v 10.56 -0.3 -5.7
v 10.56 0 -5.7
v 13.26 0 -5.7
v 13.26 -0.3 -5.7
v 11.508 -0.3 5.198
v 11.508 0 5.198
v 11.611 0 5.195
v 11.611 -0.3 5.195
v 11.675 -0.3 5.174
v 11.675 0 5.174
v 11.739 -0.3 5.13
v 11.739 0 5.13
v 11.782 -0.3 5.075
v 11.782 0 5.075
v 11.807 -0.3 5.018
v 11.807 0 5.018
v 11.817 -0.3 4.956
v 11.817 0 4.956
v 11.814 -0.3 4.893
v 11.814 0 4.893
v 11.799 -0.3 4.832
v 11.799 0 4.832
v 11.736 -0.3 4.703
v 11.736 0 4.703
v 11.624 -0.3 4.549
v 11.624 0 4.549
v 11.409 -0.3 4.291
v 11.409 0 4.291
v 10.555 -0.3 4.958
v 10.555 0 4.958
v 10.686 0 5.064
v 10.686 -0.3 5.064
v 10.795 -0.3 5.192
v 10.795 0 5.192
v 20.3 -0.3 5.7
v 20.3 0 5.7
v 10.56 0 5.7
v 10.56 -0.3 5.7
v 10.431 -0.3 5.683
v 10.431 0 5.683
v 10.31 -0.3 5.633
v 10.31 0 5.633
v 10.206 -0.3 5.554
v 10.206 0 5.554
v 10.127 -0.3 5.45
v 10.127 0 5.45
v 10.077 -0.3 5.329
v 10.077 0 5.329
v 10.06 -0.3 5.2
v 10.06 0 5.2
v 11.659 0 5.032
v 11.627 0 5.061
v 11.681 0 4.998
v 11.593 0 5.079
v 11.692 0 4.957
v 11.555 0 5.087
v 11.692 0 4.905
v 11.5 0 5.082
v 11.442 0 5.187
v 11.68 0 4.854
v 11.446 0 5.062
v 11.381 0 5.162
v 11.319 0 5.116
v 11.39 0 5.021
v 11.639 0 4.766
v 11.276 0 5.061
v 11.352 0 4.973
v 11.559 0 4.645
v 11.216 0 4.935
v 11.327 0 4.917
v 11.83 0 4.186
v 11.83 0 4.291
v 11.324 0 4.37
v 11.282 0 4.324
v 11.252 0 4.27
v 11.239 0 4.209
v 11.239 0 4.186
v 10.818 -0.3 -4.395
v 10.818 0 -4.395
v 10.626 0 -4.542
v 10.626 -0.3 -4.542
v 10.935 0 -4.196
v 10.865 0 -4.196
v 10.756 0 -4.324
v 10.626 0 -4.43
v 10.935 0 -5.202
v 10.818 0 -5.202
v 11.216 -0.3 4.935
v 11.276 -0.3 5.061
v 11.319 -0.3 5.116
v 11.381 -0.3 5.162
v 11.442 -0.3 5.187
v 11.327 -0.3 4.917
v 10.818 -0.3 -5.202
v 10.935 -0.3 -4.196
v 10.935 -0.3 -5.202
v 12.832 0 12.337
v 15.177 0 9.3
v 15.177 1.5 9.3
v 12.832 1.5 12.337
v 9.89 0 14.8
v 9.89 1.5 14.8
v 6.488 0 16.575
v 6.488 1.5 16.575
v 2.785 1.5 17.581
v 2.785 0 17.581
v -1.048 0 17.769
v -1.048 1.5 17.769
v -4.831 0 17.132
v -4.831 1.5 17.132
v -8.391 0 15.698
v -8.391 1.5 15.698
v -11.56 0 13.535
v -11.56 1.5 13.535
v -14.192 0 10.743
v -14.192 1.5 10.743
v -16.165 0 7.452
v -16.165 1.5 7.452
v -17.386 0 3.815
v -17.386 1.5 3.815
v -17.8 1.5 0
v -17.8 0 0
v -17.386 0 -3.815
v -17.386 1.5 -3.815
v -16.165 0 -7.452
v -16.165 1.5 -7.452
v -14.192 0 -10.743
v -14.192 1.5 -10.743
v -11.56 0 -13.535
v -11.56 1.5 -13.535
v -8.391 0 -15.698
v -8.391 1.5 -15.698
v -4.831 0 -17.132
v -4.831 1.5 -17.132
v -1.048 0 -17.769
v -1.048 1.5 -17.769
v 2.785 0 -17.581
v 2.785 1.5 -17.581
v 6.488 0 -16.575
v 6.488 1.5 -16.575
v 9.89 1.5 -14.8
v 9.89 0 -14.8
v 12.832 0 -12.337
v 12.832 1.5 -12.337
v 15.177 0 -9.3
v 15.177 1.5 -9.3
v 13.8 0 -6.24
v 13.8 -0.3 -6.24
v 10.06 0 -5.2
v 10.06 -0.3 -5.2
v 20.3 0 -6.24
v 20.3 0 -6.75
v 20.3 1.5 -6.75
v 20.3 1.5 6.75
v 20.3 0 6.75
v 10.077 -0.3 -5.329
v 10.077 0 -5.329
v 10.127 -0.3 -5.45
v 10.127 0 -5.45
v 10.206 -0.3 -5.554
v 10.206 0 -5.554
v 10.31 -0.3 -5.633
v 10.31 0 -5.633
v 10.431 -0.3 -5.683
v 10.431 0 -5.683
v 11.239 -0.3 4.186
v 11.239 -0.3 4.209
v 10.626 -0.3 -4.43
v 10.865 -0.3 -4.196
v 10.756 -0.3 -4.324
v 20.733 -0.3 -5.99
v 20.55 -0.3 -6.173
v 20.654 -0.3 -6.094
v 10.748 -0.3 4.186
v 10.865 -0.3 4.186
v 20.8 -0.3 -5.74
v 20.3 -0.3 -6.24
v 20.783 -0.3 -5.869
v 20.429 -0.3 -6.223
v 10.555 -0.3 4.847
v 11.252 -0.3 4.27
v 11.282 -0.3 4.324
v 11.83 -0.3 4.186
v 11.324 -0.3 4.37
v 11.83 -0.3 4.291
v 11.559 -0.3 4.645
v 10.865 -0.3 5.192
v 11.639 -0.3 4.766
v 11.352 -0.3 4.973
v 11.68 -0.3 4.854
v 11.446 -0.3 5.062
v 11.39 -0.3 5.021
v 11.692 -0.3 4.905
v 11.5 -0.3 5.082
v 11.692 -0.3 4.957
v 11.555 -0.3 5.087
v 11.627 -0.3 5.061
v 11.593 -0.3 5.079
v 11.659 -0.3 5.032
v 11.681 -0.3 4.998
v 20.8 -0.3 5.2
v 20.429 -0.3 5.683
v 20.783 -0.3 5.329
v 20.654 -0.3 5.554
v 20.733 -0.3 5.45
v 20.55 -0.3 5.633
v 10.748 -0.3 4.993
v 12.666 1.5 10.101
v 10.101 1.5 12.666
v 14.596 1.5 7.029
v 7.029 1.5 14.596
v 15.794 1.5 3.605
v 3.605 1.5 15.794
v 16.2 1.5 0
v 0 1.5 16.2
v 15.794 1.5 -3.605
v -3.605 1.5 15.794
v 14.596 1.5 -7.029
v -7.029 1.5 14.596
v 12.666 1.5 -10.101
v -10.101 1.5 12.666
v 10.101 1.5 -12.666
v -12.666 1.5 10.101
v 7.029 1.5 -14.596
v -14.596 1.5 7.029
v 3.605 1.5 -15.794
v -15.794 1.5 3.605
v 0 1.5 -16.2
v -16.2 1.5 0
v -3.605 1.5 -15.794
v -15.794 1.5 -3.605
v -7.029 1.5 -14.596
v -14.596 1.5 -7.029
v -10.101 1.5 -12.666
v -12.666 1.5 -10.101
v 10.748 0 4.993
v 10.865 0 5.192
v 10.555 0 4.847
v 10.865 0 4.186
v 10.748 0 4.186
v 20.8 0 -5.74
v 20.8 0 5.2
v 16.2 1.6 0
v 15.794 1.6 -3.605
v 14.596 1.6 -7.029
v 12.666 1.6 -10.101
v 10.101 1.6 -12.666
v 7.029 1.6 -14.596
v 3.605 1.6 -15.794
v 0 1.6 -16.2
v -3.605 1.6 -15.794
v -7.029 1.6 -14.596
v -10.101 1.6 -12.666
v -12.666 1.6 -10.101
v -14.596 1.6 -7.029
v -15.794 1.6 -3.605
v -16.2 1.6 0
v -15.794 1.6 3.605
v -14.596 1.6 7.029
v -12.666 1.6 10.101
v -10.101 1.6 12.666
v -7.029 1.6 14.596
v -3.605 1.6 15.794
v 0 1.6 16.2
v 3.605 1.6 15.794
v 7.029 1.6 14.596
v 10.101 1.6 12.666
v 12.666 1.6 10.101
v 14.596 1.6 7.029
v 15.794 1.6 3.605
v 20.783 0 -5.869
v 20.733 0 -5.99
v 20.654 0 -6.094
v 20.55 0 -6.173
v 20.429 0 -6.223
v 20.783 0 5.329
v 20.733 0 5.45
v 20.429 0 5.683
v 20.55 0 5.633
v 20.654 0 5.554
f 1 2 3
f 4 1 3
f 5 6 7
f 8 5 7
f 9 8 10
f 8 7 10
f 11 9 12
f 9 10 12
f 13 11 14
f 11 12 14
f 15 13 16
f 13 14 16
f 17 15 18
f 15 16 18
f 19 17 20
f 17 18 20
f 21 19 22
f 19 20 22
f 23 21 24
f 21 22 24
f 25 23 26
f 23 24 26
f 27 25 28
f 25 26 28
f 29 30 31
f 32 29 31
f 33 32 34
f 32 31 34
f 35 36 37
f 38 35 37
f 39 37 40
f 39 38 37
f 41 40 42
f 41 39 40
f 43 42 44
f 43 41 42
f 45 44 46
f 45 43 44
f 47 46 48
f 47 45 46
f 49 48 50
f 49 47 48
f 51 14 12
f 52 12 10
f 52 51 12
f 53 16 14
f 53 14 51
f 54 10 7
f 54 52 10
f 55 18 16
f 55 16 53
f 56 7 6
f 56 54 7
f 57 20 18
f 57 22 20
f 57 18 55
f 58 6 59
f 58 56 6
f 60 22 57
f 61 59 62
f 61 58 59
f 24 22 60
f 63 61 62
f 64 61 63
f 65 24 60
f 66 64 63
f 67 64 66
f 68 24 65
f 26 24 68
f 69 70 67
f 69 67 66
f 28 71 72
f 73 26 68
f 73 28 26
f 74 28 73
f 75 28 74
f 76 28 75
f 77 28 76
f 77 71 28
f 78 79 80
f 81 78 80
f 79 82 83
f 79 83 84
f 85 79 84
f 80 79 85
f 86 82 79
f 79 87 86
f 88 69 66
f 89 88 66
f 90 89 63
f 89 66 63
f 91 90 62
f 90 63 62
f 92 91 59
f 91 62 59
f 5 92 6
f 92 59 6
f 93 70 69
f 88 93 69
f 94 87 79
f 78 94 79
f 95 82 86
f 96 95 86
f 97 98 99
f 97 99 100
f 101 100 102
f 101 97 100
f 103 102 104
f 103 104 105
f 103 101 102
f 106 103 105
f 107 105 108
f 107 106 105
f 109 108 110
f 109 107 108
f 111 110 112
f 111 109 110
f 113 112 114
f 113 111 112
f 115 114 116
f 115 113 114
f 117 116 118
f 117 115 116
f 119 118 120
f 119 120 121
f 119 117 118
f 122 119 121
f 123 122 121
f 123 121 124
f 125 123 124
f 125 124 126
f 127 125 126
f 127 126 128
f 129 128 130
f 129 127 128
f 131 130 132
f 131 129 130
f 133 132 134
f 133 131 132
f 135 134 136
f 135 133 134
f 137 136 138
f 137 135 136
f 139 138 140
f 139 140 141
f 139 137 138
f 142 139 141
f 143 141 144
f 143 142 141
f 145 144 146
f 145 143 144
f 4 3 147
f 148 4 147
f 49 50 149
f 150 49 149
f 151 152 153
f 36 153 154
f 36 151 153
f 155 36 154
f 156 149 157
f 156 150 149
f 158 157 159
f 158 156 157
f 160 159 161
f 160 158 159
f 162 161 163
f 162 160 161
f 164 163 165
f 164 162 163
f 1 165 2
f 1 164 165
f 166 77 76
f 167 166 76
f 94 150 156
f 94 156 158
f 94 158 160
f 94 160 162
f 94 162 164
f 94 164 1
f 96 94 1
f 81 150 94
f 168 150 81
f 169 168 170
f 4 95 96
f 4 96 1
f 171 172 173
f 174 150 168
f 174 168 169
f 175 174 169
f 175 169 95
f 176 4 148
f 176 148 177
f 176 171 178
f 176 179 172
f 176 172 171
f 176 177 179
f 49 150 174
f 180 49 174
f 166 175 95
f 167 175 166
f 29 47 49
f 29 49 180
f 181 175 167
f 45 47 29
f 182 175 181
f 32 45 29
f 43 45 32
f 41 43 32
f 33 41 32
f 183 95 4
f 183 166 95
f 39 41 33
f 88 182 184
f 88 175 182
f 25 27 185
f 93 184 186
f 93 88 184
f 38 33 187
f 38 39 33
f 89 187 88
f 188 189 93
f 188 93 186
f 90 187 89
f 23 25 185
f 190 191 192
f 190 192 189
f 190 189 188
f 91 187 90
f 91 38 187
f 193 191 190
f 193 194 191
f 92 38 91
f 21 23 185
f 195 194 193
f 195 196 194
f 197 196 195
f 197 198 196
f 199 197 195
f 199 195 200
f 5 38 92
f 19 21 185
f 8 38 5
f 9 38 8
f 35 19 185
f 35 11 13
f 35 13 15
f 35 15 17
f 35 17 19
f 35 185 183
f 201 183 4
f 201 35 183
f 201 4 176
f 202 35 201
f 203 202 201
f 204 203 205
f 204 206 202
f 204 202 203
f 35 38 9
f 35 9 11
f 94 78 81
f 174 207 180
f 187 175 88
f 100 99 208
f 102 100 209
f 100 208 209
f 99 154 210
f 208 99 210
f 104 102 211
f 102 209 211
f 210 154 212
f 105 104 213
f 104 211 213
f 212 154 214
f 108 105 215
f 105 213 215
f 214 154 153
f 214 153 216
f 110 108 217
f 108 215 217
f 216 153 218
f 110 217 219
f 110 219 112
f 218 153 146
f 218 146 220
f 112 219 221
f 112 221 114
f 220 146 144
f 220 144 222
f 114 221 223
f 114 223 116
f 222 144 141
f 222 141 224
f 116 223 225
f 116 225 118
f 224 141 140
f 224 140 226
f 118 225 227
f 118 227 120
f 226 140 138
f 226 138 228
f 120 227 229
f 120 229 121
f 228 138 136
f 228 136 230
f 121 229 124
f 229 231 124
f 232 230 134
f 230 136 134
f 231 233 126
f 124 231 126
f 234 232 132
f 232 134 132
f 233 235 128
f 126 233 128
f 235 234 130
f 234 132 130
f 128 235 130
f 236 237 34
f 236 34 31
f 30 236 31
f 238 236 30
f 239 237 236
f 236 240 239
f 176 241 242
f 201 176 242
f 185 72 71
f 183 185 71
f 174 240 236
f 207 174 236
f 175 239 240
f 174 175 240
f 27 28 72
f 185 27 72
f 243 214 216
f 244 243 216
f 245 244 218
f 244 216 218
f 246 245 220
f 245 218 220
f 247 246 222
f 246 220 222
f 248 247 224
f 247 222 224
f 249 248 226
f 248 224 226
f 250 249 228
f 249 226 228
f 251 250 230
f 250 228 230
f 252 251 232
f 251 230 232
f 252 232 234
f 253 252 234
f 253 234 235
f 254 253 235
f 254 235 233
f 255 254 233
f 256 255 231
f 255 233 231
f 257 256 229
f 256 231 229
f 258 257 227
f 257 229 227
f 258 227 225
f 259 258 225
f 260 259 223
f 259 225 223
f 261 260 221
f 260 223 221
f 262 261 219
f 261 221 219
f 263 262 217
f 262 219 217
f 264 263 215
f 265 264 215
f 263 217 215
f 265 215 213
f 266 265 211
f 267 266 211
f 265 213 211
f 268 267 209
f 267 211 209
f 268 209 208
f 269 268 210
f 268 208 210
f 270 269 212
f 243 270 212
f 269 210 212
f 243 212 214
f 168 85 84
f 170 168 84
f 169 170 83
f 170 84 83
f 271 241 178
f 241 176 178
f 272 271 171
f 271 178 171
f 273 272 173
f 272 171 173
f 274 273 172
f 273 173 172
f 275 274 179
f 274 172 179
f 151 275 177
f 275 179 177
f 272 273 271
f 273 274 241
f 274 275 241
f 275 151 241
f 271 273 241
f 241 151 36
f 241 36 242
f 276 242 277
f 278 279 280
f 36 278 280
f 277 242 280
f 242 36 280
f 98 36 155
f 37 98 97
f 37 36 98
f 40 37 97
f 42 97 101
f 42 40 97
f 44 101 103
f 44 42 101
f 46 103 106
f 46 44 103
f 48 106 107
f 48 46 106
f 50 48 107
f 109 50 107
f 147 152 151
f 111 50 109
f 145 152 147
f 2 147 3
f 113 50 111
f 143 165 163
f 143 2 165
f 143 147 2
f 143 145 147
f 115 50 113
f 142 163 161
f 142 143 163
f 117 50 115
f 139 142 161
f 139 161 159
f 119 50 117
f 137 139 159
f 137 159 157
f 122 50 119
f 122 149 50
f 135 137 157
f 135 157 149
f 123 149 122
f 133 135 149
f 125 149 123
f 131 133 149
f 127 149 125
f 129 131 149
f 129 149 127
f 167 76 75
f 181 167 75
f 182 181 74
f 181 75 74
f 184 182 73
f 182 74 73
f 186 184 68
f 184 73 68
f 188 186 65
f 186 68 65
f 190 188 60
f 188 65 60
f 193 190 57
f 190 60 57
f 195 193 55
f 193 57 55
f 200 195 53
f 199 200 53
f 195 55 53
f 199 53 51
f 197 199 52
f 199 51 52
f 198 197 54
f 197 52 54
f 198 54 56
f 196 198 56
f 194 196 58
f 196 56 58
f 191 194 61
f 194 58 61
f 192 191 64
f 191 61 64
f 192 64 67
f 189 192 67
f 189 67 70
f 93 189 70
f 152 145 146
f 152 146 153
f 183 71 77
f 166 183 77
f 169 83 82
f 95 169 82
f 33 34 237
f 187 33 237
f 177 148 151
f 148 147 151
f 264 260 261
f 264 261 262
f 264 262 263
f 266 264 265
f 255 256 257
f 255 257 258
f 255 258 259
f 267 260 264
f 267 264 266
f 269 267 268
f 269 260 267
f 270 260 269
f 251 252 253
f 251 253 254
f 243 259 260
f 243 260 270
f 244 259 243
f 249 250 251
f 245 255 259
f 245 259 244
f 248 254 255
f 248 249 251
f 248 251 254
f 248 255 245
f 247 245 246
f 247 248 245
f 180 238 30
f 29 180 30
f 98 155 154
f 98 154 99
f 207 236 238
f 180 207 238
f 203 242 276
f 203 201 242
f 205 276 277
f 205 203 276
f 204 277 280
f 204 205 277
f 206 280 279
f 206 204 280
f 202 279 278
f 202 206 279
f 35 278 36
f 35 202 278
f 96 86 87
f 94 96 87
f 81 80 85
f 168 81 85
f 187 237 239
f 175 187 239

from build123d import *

# Parameters (mm, degrees)
EXTRUDE_1_DEPTH = 1.5
SKETCH_3_R      = 16.2
EXTRUDE_2_DEPTH = 0.1
EXTRUDE_3_DEPTH = 0.3
FILLET_1_R      = 0.5


with BuildPart() as part:
    # 草图1 → 凸台-拉伸1 (new body)
    with BuildSketch(Plane(origin=(0, 0, 0), x_dir=(1, 0, 0), z_dir=(0, 1, 0))):
        with BuildLine():
            Line((20.3, 6.75), (20.3, -6.75))
            Line((20.3, -6.75), (15.17728566, -9.3))
            ThreePointArc((15.17728566, -9.3), (-17.8, 0), (15.17728566, 9.3))
            Line((15.17728566, 9.3), (20.3, 6.75))
        make_face()
    extrude(amount=EXTRUDE_1_DEPTH)

    # 草图3 → 凸台-拉伸2 (add)
    with BuildSketch(Plane(origin=(0, 1.5, 0), x_dir=(1, 0, 0), z_dir=(0, 1, 0))):
        Circle(SKETCH_3_R)
    extrude(amount=EXTRUDE_2_DEPTH)

    # 草图4 → 凸台-拉伸3 (add)
    with BuildSketch(Plane.XZ):
        Polygon((20.8, -6.24), (20.8, 5.7), (10.06, 5.7), (10.06, -5.7), (13.26, -5.7), (13.8, -6.24), align=None)
        with BuildLine():
            add(Edge.make_bspline(
                [(10.818486802, -4.395328042), (10.805172896, -4.40810149), (10.777735498, -4.434425106), (10.731585338, -4.471001471), (10.680718947, -4.50727864), (10.644265505, -4.529889796), (10.625504346, -4.541526873)],
                knots=[0, 0, 0, 0, 5.5324e-05, 0.000114012, 0.000176454, 0.000242669, 0.000242669, 0.000242669, 0.000242669], degree=3))
            Line((10.625504346, -4.541526873), (10.625504346, -4.430415762))
            add(Edge.make_bspline(
                [(10.625504346, -4.430415762), (10.637511845, -4.422097374), (10.661358973, -4.405576894), (10.695199347, -4.378706463), (10.727916327, -4.35134661), (10.758520561, -4.322379824), (10.787985268, -4.292793589), (10.815334495, -4.261758783), (10.841379972, -4.22987118), (10.857300173, -4.207631606), (10.865270428, -4.196497633)],
                knots=[0, 0, 0, 0, 4.381e-05, 8.7008e-05, 0.000129577, 0.000171717, 0.000213376, 0.0002548, 0.000295763, 0.000336832, 0.000336832, 0.000336832, 0.000336832], degree=3))
            Line((10.865270428, -4.196497633), (10.935445867, -4.196497633))
            Line((10.935445867, -4.196497633), (10.935445867, -5.202345586))
            Line((10.935445867, -5.202345586), (10.818486802, -5.202345586))
            Line((10.818486802, -5.202345586), (10.818486802, -4.395328042))
        make_face(mode=Mode.SUBTRACT)
        with BuildLine():
            add(Edge.make_bspline(
                [(10.747897656, 4.993028455), (10.734583749, 4.980255007), (10.707146352, 4.953931392), (10.660996192, 4.917355027), (10.610129801, 4.881077858), (10.573676359, 4.858466702), (10.5549152, 4.846829625)],
                knots=[0, 0, 0, 0, 5.5324e-05, 0.000114012, 0.000176454, 0.000242669, 0.000242669, 0.000242669, 0.000242669], degree=3))
            Line((10.5549152, 4.846829625), (10.5549152, 4.957940736))
            add(Edge.make_bspline(
                [(10.5549152, 4.957940736), (10.566922699, 4.966259124), (10.590769826, 4.982779604), (10.6246102, 5.009650034), (10.65732718, 5.037009887), (10.687931415, 5.065976673), (10.717396122, 5.095562908), (10.744745348, 5.126597715), (10.770790825, 5.158485318), (10.786711026, 5.180724892), (10.794681281, 5.191858864)],
                knots=[0, 0, 0, 0, 4.381e-05, 8.7008e-05, 0.000129577, 0.000171717, 0.000213376, 0.0002548, 0.000295763, 0.000336832, 0.000336832, 0.000336832, 0.000336832], degree=3))
            Line((10.794681281, 5.191858864), (10.86485672, 5.191858864))
            Line((10.86485672, 5.191858864), (10.86485672, 4.186010911))
            Line((10.86485672, 4.186010911), (10.747897656, 4.186010911))
            Line((10.747897656, 4.186010911), (10.747897656, 4.993028455))
        make_face(mode=Mode.SUBTRACT)
        with BuildLine():
            add(Edge.make_bspline(
                [(11.239125726, 4.209402724), (11.239833141, 4.216646412), (11.241239164, 4.23104361), (11.246176296, 4.252223765), (11.253123203, 4.272903106), (11.262262649, 4.29307236), (11.273547522, 4.312739702), (11.287428195, 4.331488732), (11.302928415, 4.350145808), (11.321465332, 4.367779976), (11.341452247, 4.386542756), (11.362154394, 4.408019092), (11.384577692, 4.431466047), (11.407813575, 4.457882847), (11.432843118, 4.486319526), (11.458703548, 4.517616287), (11.486012518, 4.551174546), (11.514003658, 4.586370362), (11.541434011, 4.621720239), (11.56671184, 4.65597954), (11.589699984, 4.687968259), (11.610212924, 4.717799327), (11.627704069, 4.745816407), (11.642893445, 4.771584725), (11.655854012, 4.795057685), (11.668787399, 4.823092213), (11.680993939, 4.855423395), (11.690565178, 4.892152564), (11.694914493, 4.926144912), (11.693204675, 4.957381602), (11.686490374, 4.98588729), (11.674759334, 5.011748614), (11.658296591, 5.035057433), (11.637248958, 5.054942362), (11.613257207, 5.071313574), (11.586558607, 5.082313299), (11.557991357, 5.087872292), (11.528104736, 5.087369351), (11.497980127, 5.082013566), (11.467969579, 5.072704256), (11.439039112, 5.058289936), (11.410696566, 5.040307531), (11.384436934, 5.017140759), (11.36135616, 4.988611831), (11.341721738, 4.954866078), (11.331926076, 4.929936265), (11.326845024, 4.917005063)],
                knots=[0, 0, 0, 0, 2.1814e-05, 4.3357e-05, 6.5069e-05, 8.7171e-05, 0.000109684, 0.000132949, 0.000157077, 0.000182347, 0.000209615, 0.000239329, 0.00027181, 0.000306939, 0.000344857, 0.000385456, 0.00042872, 0.000474656, 0.000520361, 0.000562944, 0.000602373, 0.000638538, 0.000671529, 0.000701432, 0.000728277, 0.000751921, 0.000794003, 0.000831773, 0.00086557, 0.000896375, 0.00092511, 0.00095293, 0.000981054, 0.00101016, 0.001039355, 0.001067712, 0.001096172, 0.001126062, 0.001156827, 0.001187721, 0.001219978, 0.001253501, 0.00128818, 0.001324511, 0.001363144, 0.00140478, 0.00140478, 0.00140478, 0.00140478], degree=3))
            Line((11.326845024, 4.917005063), (11.215733913, 4.934548923))
            add(Edge.make_bspline(
                [(11.215733913, 4.934548923), (11.219656813, 4.945425545), (11.227289073, 4.966586728), (11.240431556, 4.996719226), (11.254008051, 5.024768665), (11.268391205, 5.050549193), (11.283893055, 5.073876788), (11.300137608, 5.094978241), (11.317197246, 5.113850725), (11.335137556, 5.130472165), (11.35389693, 5.145124772), (11.373604192, 5.157831984), (11.394013956, 5.168932074), (11.415206508, 5.178352557), (11.43722761, 5.185944542), (11.460175176, 5.191465532), (11.483814494, 5.195748716), (11.499956502, 5.19704853), (11.508131574, 5.197706818)],
                knots=[0, 0, 0, 0, 3.4679e-05, 6.747e-05, 9.8564e-05, 0.000128143, 0.000155956, 0.000182513, 0.000207966, 0.000232182, 0.000255794, 0.000279284, 0.000302447, 0.000325428, 0.000348785, 0.000372214, 0.000396178, 0.000420768, 0.000420768, 0.000420768, 0.000420768], degree=3))
            add(Edge.make_bspline(
                [(11.508131574, 5.197706818), (11.517654805, 5.198470616), (11.536175647, 5.199956055), (11.563321528, 5.200235741), (11.588939793, 5.198463956), (11.613483722, 5.195099015), (11.637461864, 5.189150579), (11.661491911, 5.180373219), (11.685801114, 5.168509643), (11.710349938, 5.153958828), (11.73441354, 5.136146543), (11.756199385, 5.11374856), (11.775424492, 5.087198528), (11.792601639, 5.05716399), (11.806466377, 5.023396102), (11.814804628, 4.985783772), (11.817862258, 4.944983333), (11.816182176, 4.908994618), (11.812089602, 4.878541375), (11.806355457, 4.854202585), (11.798091587, 4.828865854), (11.788361792, 4.802138754), (11.775441683, 4.774655097), (11.760899169, 4.745824926), (11.74350862, 4.716170927), (11.727726825, 4.690551343), (11.713428345, 4.669220128), (11.70145212, 4.651813704), (11.688368763, 4.633233154), (11.673683781, 4.613773904), (11.658174582, 4.592989779), (11.641491734, 4.571060318), (11.623490026, 4.548175641), (11.604377689, 4.524045702), (11.584068424, 4.498734851), (11.562470569, 4.472389765), (11.539590091, 4.445069691), (11.51578304, 4.416404416), (11.490759524, 4.386634205), (11.46450038, 4.355787108), (11.436918885, 4.324002126), (11.418239887, 4.302325786), (11.408716369, 4.291274069)],
                knots=[0, 0, 0, 0, 2.8656e-05, 5.5731e-05, 8.1347e-05, 0.000105638, 0.000129959, 0.000155311, 0.000182241, 0.000210992, 0.000240838, 0.000271776, 0.00030431, 0.000338939, 0.000375378, 0.000413366, 0.000453999, 0.000497793, 0.000521195, 0.000546098, 0.000572677, 0.000601119, 0.000631359, 0.000663713, 0.000697965, 0.000734447, 0.00075397, 0.000774997, 0.000797834, 0.000822135, 0.000848126, 0.000875634, 0.000904794, 0.000935474, 0.000967981, 0.001002147, 0.001037671, 0.001074887, 0.001113934, 0.001154341, 0.001196417, 0.001240183, 0.001240183, 0.001240183, 0.001240183], degree=3))
            Line((11.408716369, 4.291274069), (11.829769001, 4.291274069))
            Line((11.829769001, 4.291274069), (11.829769001, 4.186010911))
            Line((11.829769001, 4.186010911), (11.239125726, 4.186010911))
            Line((11.239125726, 4.186010911), (11.239125726, 4.209402724))
        make_face(mode=Mode.SUBTRACT)
    extrude(amount=EXTRUDE_3_DEPTH)

    # 圆角1
    fillet_1_edges = [part.edges().sort_by_distance(p)[0] for p in [
        (10.06, -0.15, -5.7),
        (10.06, -0.15, 5.7),
        (20.8, -0.15, 5.7),
        (20.8, -0.15, -6.24),
    ]]
    fillet(fillet_1_edges, radius=FILLET_1_R)


solid = part.part
